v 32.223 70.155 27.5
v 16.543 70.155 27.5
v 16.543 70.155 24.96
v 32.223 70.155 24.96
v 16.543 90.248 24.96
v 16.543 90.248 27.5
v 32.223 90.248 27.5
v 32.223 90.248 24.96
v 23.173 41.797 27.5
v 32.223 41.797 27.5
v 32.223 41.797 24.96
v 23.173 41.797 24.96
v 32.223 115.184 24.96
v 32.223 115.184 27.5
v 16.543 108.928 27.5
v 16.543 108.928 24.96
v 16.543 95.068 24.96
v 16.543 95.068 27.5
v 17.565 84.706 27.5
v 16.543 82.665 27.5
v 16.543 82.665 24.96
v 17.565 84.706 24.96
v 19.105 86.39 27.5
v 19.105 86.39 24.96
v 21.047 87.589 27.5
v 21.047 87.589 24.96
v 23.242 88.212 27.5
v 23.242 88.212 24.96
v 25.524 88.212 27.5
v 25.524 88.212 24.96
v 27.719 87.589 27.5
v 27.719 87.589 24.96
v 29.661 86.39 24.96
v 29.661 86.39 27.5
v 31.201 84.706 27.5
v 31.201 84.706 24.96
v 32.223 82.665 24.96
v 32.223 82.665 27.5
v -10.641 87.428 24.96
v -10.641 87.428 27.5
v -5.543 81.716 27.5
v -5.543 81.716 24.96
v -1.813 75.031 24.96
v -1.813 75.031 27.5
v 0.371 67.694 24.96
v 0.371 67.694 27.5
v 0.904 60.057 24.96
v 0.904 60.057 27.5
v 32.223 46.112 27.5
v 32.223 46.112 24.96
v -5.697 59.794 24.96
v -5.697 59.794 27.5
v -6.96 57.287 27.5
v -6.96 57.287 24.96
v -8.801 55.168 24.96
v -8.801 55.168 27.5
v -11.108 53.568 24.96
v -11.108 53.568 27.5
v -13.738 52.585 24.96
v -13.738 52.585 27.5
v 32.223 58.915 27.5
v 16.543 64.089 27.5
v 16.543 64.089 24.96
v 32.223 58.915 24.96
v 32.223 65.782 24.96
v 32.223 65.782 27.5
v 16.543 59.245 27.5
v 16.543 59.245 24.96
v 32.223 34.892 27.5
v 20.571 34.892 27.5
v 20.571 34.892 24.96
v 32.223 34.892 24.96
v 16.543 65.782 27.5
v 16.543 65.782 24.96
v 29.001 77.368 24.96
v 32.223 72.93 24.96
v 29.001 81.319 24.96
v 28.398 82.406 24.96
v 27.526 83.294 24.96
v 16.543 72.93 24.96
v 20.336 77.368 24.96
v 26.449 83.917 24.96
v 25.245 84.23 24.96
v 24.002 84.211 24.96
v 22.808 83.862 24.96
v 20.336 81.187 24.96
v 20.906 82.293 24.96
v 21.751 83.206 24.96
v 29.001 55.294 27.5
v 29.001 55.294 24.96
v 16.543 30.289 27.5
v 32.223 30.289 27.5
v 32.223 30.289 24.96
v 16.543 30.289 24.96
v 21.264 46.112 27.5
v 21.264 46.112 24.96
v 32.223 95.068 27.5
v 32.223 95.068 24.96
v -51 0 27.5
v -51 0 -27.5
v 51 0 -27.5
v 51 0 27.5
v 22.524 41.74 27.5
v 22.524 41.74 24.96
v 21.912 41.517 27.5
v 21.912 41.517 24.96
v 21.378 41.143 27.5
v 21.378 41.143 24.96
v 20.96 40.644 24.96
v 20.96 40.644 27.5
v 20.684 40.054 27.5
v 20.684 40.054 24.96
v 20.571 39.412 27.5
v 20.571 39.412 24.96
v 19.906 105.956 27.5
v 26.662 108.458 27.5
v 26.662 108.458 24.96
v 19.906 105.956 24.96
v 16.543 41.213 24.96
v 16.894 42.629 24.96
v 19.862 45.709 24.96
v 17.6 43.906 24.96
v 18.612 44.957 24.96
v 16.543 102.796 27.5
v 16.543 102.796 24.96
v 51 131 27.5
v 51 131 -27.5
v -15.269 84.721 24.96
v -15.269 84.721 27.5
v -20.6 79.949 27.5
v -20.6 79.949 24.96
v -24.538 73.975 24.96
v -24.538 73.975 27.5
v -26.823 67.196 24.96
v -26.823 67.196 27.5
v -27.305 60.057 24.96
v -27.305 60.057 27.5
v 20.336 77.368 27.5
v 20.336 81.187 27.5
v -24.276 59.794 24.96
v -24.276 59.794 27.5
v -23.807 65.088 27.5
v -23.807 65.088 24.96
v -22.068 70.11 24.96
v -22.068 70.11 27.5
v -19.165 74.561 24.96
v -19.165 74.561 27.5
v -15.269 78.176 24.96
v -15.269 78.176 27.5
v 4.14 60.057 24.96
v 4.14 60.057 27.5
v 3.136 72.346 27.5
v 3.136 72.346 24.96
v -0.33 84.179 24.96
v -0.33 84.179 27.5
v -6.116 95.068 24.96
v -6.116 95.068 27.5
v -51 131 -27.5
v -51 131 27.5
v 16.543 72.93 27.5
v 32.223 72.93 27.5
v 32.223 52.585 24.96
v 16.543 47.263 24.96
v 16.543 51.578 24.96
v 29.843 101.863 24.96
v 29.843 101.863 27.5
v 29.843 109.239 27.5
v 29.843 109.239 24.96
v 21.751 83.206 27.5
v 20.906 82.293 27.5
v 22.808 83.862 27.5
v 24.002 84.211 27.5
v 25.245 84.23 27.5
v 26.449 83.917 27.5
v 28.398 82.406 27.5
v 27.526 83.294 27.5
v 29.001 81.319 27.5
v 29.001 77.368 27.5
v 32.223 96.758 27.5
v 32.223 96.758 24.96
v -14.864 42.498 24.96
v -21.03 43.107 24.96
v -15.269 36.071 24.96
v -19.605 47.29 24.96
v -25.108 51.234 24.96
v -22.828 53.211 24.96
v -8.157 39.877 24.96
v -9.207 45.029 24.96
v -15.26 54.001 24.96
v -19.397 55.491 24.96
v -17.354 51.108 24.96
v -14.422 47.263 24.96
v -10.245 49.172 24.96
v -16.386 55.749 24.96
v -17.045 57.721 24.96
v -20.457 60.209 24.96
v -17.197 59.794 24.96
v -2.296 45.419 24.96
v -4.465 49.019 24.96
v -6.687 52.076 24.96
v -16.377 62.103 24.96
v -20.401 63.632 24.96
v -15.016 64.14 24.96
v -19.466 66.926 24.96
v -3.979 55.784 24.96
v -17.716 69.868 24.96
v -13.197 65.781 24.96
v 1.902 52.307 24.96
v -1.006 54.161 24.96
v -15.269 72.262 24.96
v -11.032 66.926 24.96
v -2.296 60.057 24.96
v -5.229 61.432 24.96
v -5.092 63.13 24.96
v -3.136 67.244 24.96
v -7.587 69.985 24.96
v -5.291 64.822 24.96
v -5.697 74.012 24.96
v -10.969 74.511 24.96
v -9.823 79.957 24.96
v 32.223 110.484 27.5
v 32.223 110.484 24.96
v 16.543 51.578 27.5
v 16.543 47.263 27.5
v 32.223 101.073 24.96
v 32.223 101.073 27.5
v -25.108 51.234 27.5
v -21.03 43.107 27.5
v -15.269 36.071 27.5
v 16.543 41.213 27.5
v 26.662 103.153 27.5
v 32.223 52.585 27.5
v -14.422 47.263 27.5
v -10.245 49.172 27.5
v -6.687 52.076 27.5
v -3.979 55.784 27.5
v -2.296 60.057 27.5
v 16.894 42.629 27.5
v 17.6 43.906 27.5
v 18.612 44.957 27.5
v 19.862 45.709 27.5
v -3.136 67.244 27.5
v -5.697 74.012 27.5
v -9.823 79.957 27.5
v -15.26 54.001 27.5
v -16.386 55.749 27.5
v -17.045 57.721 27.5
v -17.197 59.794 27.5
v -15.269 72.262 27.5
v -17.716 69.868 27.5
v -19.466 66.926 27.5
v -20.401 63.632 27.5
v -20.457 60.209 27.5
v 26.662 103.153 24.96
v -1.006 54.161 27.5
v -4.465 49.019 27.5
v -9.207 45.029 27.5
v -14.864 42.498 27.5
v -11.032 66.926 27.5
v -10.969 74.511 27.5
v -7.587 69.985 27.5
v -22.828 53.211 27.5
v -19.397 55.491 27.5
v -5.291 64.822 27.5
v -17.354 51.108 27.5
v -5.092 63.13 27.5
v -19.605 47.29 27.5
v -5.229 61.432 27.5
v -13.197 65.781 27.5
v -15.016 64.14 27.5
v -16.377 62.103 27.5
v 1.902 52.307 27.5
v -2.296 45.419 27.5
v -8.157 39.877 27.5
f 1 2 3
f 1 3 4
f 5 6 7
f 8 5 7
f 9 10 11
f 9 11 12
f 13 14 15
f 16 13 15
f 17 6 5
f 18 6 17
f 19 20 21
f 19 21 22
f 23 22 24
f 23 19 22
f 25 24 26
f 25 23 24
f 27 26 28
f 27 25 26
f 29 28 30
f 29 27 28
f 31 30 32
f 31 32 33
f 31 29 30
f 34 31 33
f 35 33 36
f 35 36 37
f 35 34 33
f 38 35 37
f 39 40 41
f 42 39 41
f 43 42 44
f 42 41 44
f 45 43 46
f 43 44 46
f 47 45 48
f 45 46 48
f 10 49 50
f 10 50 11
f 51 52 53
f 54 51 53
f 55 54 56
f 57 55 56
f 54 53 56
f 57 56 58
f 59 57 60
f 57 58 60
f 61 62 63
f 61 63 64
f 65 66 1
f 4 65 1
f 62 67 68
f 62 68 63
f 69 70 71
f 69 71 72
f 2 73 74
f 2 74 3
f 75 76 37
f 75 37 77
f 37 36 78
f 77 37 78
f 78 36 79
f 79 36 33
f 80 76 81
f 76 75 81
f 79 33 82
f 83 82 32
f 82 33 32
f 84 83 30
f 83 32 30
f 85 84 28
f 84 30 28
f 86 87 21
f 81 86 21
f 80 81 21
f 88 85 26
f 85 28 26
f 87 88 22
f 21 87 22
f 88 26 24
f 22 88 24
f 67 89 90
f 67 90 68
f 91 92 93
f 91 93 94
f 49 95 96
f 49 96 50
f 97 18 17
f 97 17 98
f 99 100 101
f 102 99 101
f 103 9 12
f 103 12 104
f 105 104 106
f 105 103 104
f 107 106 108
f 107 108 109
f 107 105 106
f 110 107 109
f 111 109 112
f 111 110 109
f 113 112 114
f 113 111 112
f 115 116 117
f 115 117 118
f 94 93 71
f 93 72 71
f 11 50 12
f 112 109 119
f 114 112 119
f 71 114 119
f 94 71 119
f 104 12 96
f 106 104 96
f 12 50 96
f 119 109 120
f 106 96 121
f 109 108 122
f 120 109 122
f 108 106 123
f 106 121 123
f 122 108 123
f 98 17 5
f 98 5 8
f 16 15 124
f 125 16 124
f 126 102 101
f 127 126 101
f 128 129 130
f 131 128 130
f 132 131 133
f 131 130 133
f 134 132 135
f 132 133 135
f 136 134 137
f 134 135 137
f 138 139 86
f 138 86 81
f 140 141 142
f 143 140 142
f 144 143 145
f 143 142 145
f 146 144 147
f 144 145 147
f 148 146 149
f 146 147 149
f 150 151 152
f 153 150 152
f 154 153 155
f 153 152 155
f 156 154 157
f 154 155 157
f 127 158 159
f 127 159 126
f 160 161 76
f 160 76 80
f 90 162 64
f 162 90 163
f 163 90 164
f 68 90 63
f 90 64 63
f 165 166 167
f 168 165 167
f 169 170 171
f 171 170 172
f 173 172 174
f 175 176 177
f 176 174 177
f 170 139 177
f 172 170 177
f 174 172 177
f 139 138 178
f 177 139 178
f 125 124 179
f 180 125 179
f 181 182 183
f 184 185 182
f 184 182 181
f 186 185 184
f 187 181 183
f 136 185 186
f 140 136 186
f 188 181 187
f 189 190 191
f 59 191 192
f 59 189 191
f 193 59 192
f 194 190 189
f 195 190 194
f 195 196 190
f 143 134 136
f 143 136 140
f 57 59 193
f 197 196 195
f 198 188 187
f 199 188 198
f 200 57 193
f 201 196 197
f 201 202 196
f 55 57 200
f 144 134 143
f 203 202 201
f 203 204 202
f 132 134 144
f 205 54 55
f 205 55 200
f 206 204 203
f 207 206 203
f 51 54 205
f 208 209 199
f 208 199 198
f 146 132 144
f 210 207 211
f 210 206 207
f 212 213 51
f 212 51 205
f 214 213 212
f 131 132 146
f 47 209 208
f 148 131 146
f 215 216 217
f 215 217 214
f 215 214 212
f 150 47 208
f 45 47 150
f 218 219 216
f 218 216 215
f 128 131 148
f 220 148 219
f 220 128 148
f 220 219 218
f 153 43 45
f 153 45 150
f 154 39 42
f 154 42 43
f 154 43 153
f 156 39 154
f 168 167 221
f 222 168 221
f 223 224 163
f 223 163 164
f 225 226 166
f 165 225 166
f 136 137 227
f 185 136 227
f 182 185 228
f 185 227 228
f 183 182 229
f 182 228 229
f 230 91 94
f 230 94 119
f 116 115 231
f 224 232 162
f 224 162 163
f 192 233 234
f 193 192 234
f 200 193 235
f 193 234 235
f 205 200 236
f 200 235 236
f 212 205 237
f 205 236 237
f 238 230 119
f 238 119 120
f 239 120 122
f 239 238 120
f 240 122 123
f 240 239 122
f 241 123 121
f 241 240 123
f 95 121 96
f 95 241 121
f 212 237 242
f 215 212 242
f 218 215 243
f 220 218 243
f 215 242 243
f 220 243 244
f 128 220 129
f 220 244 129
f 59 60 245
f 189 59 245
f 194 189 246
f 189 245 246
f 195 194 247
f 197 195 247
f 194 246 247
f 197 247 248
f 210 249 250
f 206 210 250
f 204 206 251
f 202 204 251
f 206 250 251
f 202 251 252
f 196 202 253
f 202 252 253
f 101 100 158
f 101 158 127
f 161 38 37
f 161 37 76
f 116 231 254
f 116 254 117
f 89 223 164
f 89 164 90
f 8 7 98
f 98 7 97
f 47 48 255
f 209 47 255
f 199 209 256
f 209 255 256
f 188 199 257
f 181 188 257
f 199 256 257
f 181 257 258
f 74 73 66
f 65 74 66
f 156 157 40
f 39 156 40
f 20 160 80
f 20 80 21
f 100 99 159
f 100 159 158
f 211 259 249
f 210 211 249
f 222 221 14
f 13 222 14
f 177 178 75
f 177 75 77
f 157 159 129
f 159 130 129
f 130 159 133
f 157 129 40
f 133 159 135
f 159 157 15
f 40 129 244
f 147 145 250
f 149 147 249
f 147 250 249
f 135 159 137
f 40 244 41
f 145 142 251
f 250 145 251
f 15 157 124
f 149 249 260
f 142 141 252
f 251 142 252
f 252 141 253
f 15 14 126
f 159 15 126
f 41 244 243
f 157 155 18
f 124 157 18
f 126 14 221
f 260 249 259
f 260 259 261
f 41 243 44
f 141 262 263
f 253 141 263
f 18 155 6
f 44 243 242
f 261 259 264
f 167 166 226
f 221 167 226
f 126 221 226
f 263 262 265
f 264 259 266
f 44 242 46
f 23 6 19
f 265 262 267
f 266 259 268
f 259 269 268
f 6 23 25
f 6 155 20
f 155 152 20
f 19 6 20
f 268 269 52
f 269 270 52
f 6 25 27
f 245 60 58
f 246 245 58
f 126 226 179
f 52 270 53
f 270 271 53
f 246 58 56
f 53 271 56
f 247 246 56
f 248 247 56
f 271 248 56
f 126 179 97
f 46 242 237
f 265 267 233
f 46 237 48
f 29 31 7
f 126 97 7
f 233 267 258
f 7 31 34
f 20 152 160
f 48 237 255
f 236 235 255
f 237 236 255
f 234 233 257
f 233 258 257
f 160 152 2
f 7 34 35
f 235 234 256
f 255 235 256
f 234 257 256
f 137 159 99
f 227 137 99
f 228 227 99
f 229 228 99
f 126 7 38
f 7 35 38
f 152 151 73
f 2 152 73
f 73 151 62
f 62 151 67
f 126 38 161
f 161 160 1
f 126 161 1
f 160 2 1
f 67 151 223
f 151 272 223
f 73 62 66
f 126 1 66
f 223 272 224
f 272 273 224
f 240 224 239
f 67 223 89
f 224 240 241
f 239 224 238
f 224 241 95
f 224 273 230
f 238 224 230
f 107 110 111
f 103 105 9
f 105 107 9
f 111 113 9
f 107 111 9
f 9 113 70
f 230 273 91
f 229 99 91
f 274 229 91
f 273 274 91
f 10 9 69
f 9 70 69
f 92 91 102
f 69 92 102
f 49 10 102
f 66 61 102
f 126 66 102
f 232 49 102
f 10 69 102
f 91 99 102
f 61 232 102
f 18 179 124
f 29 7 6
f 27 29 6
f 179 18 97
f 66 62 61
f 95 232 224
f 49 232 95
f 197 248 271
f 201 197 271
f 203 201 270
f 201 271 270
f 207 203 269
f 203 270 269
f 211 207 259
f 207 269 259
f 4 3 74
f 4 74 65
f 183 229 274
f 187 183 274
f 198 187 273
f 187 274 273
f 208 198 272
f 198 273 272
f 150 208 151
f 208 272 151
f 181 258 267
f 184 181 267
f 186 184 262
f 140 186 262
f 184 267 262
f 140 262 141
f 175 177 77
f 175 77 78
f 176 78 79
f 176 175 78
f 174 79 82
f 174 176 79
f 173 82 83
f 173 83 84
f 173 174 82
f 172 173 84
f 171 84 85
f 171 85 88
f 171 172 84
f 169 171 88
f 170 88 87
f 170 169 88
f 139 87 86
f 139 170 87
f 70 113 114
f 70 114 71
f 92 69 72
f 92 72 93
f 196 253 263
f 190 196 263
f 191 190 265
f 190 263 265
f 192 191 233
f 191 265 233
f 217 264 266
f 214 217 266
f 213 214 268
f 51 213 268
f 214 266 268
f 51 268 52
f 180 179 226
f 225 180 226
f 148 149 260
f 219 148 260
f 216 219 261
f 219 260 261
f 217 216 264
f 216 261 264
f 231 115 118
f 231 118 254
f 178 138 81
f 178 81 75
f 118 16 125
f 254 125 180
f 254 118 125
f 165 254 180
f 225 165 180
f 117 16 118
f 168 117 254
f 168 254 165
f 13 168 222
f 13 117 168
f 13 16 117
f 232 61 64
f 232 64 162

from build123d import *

# Parameters (mm, degrees)
SKETCH1_W           = 102
SKETCH1_H           = 55
BOSS_EXTRUDE1_DEPTH = 131
SKETCH2_W           = 15.67927859
SKETCH2_H           = 4.373721057
SKETCH2_H_2         = 4.820111396
CUT_EXTRUDE1_DEPTH  = 2.54


with BuildPart() as part:
    # Sketch1 → Boss-Extrude1 (new body)
    with BuildSketch(Plane(origin=(0, 0, 0), x_dir=(1, 0, 0), z_dir=(0, 1, 0))):
        Rectangle(SKETCH1_W, SKETCH1_H)
    extrude(amount=BOSS_EXTRUDE1_DEPTH)

    # Sketch2 → Cut-Extrude1 (cut)
    # profile 1 of 7: a face of its own
    with BuildSketch(Plane.XY.offset(27.5)):
        with BuildLine():
            Line((32.222685011, 30.289063801), (16.543406421, 30.289063801))
            Line((16.543406421, 30.289063801), (16.543406421, 41.213310419))
            ThreePointArc((16.543406421, 41.213310419), (18.071687856, 44.464476673), (21.263986447, 46.112188983))
            Line((21.263986447, 46.112188983), (32.222685011, 46.112188983))
            Line((32.222685011, 46.112188983), (32.222685011, 41.796791207))
            Line((32.222685011, 41.796791207), (23.173438966, 41.796791207))
            ThreePointArc((23.173438966, 41.796791207), (21.378356157, 41.143325428), (20.571111013, 39.411940118))
            Line((20.571111013, 39.411940118), (20.571111013, 34.892154763))
            Line((20.571111013, 34.892154763), (32.222685011, 34.892154763))
            Line((32.222685011, 34.892154763), (32.222685011, 30.289063801))
        make_face()
    # profile 2 of 7: a face of its own
    with BuildSketch(Plane.XY.offset(27.5)):
        Polygon((32.222685011, 58.914535722), (32.222685011, 52.585285649), (16.543406421, 47.262961724), (16.543406421, 51.578359501), (29.001278605, 55.294208224), (16.543406421, 59.244665953), (16.543406421, 64.088679598), align=None)
    # profile 3 of 7: a face of its own
    with BuildSketch(Plane.XY.offset(27.5)):
        with Locations((24.383045716, 67.968593438)):
            Rectangle(SKETCH2_W, SKETCH2_H)
    # profile 4 of 7: a face of its own
    with BuildSketch(Plane.XY.offset(27.5)):
        with BuildLine():
            Line((32.222685011, 72.930180229), (16.543406421, 72.930180229))
            Line((16.543406421, 72.930180229), (16.543406421, 82.665236776))
            ThreePointArc((16.543406421, 82.665236776), (24.383045716, 88.291485928), (32.222685011, 82.665236776))
            Line((32.222685011, 82.665236776), (32.222685011, 72.930180229))
        make_face()
        with BuildLine():
            Line((20.335941045, 81.186975839), (20.335941045, 77.367606352))
            Line((20.335941045, 77.367606352), (29.001278605, 77.367606352))
            Line((29.001278605, 77.367606352), (29.001278605, 81.318517332))
            ThreePointArc((29.001278605, 81.318517332), (24.622917057, 84.262772166), (20.335941045, 81.186975839))
        make_face(mode=Mode.SUBTRACT)
    # profile 5 of 7: a face of its own
    with BuildSketch(Plane.XY.offset(27.5)):
        with Locations((24.383045716, 92.657631845)):
            Rectangle(SKETCH2_W, SKETCH2_H_2)
    # profile 6 of 7: a face of its own
    with BuildSketch(Plane.XY.offset(27.5)):
        Polygon((32.222685011, 96.757683119), (32.222685011, 101.073072233), (29.843242059, 101.863254429), (29.843242059, 109.239047859), (32.222685011, 110.484071773), (32.222685011, 115.184037049), (16.543406421, 108.92779188), (16.543406421, 102.796049103), align=None)
        Polygon((26.661750428, 108.457670817), (19.906160177, 105.955600354), (26.661750428, 103.153281435), align=None, mode=Mode.SUBTRACT)
    # profile 7 of 7: a face of its own
    with BuildSketch(Plane.XY.offset(27.5)):
        with BuildLine():
            Line((-6.115743329, 95.067687543), (-10.640576822, 87.427905373))
            ThreePointArc((-10.640576822, 87.427905373), (-1.813234505, 75.031176459), (0.903633442, 60.057216105))
            ThreePointArc((0.903633442, 60.057216105), (-4.465154431, 49.019149341), (-14.864068382, 42.497999922))
            ThreePointArc((-14.864068382, 42.497999922), (-21.425458539, 50.136520198), (-24.276421001, 59.794203453))
            ThreePointArc((-24.276421001, 59.794203453), (-22.06840901, 70.110226473), (-15.269017603, 78.17644767))
            ThreePointArc((-15.269017603, 78.17644767), (-9.151476423, 72.34247097), (-5.290820846, 64.822169595))
            ThreePointArc((-5.290820846, 64.822169595), (-5.118898357, 62.277928614), (-5.69667759, 59.794203453))
            ThreePointArc((-5.69667759, 59.794203453), (-8.801475151, 55.16826153), (-13.737803966, 52.585285649))
            ThreePointArc((-13.737803966, 52.585285649), (-16.38620677, 55.748861503), (-17.197044672, 59.794203453))
            ThreePointArc((-17.197044672, 59.794203453), (-15.016123652, 64.139522978), (-11.03158578, 66.925501483))
            Line((-11.03158578, 66.925501483), (-15.269017603, 72.262107708))
            ThreePointArc((-15.269017603, 72.262107708), (-19.465910752, 66.925501483), (-20.457305995, 60.20907285))
            ThreePointArc((-20.457305995, 60.20907285), (-18.493685046, 53.244585471), (-14.421821953, 47.262961724))
            ThreePointArc((-14.421821953, 47.262961724), (-6.68710858, 52.075713319), (-2.295755467, 60.057216105))
            ThreePointArc((-2.295755467, 60.057216105), (-5.69667759, 74.012425991), (-15.269380997, 84.721184263))
            ThreePointArc((-15.269380997, 84.721184263), (-24.537703565, 73.975429659), (-27.304719411, 60.057216105))
            ThreePointArc((-27.304719411, 60.057216105), (-23.293771998, 47.057349301), (-15.269380997, 36.07129518))
            ThreePointArc((-15.269380997, 36.07129518), (-2.295755467, 45.418962155), (4.139721094, 60.057216105))
            ThreePointArc((4.139721094, 60.057216105), (1.703886183, 78.350977538), (-6.115743329, 95.067687543))
        make_face()
    extrude(amount=-CUT_EXTRUDE1_DEPTH, mode=Mode.SUBTRACT)


solid = part.part
